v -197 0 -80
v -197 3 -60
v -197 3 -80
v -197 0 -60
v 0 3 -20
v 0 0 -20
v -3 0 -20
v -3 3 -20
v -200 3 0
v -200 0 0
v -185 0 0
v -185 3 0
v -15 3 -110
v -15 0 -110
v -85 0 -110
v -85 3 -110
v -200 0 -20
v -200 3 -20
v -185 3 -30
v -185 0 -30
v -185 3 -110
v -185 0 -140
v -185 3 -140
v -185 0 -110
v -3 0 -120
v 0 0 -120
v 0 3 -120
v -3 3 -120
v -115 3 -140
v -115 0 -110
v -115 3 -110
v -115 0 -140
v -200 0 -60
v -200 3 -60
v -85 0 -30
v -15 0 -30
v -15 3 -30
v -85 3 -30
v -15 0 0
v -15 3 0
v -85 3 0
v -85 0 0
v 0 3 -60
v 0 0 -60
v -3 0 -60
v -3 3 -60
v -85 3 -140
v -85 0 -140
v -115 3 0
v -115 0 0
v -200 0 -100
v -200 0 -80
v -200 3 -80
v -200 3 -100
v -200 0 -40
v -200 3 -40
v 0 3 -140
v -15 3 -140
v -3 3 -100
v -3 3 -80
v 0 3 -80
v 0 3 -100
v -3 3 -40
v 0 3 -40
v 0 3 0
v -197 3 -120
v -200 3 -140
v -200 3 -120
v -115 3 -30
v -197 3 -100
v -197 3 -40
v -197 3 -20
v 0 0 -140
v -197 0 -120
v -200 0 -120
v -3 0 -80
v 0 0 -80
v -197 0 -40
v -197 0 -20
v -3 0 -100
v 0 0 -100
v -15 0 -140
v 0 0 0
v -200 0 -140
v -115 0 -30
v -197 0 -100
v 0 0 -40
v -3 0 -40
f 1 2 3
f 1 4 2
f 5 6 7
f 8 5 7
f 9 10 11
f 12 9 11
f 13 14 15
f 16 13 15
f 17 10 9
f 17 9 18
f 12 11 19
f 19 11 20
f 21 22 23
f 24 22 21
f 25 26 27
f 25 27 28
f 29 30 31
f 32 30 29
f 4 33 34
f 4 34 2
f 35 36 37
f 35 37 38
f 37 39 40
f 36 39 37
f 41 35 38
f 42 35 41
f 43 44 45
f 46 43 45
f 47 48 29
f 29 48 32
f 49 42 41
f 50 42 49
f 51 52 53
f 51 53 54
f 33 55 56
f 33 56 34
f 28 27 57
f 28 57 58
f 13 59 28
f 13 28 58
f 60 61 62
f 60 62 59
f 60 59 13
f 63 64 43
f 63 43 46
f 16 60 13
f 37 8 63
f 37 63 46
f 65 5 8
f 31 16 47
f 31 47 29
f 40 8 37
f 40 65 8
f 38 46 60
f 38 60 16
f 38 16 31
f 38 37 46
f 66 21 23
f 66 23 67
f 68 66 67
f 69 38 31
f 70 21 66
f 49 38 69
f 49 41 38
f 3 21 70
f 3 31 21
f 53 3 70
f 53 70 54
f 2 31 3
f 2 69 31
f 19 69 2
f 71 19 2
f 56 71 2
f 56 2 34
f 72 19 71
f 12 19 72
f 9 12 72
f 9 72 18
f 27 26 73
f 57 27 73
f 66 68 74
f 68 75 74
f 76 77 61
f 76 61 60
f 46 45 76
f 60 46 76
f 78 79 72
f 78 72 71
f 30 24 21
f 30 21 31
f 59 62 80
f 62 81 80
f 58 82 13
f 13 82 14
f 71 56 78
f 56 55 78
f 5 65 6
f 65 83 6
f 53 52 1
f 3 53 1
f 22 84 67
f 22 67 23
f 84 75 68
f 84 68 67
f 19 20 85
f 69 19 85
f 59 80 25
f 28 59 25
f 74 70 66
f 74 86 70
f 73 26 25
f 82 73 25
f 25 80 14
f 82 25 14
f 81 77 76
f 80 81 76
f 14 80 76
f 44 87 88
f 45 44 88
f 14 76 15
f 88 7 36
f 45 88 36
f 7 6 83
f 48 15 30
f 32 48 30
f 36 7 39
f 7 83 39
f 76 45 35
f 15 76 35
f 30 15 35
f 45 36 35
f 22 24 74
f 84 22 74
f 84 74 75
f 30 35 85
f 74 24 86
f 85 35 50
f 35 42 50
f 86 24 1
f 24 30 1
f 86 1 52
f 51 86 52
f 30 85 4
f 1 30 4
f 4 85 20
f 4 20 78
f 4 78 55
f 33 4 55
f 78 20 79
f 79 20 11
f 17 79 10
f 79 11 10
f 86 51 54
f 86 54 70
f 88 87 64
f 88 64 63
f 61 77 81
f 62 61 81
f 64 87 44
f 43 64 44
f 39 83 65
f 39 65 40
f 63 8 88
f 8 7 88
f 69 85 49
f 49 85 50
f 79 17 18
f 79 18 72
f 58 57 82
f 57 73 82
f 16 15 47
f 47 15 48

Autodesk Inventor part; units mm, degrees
ref_plane "YZ Plane" through (0, 0, 0) normal (1, 0, 0) x (0, 1, 0)
ref_plane "XZ Plane" through (0, 0, 0) normal (0, 1, 0) x (-1, 0, 0)
ref_plane "XY Plane" through (0, 0, 0) normal (0, 0, 1) x (1, 0, 0)
sketch "Sketch1" plane through (0, 0, 0) normal (0, 1, 0) x (-1, 0, 0)
  line L0 (200, 0) -> (185, 0)
  line L1 (200, 0) -> (215, 0) construction
  line L2 (185, 0) -> (185, -30)
  line L3 (185, -30) -> (115, -30)
  line L4 (115, -30) -> (115, 0)
  line L5 (200, -140) -> (185, -140)
  line L6 (200, -140) -> (215, -140) construction
  line L7 (185, -140) -> (185, -110)
  line L8 (185, -110) -> (115, -110)
  line L9 (115, -110) -> (115, -140)
  line L10 (200, 0) -> (197, 0)
  line L11 (197, 0) -> (197, -140)
  line L12 (197, 0) -> (337, 0) construction
  line L13 (200, 0) -> (200, -20)
  line L14 (200, -20) -> (200, -40)
  line L15 (200, -40) -> (200, -60)
  line L16 (200, -60) -> (200, -80)
  line L17 (200, -80) -> (200, -100)
  line L18 (200, -100) -> (200, -120)
  line L19 (200, -120) -> (200, -140)
  line L20 (200, -20) -> (197, -20)
  line L21 (200, -40) -> (197, -40)
  line L22 (200, -60) -> (197, -60)
  line L23 (200, -80) -> (197, -80)
  line L24 (200, -100) -> (197, -100)
  line L25 (200, -120) -> (197, -120)
  line L26 (100, 0) -> (100, -140)
  line L27 (100, -140) -> (200, -140)
  line L28 (100, 0) -> (200, 0)
  line L29 (0, 0) -> (15, 0)
  line L30 (0, 0) -> (-15, 0) construction
  line L31 (15, 0) -> (15, -30)
  line L32 (15, -30) -> (85, -30)
  line L33 (85, -30) -> (85, 0)
  line L34 (85, -110) -> (85, -140)
  line L35 (15, -140) -> (15, -110)
  line L36 (15, -110) -> (85, -110)
  line L37 (0, -140) -> (15, -140)
  line L38 (0, -140) -> (-15, -140) construction
  line L39 (0, 0) -> (3, 0)
  line L40 (3, 0) -> (3, -140)
  line L41 (3, 0) -> (-137, 0) construction
  line L42 (0, 0) -> (0, -20)
  line L43 (0, -20) -> (0, -40)
  line L44 (0, -40) -> (0, -60)
  line L45 (0, -60) -> (0, -80)
  line L46 (0, -80) -> (0, -100)
  line L47 (0, -100) -> (0, -120)
  line L48 (0, -120) -> (0, -140)
  line L49 (0, -20) -> (3, -20)
  line L50 (0, -40) -> (3, -40)
  line L51 (0, -60) -> (3, -60)
  line L52 (0, -80) -> (3, -80)
  line L53 (0, -100) -> (3, -100)
  line L54 (0, -120) -> (3, -120)
  line L55 (100, -140) -> (0, -140)
  line L56 (100, 0) -> (0, 0)
  dimension "d2" = 15
  dimension "d3" = 180
  dimension "d4" = 30
  dimension "d5" = 70
  dimension "d6" = 90
  dimension "d12" = 3
  dimension "d13" = 140
  dimension "d14" = 90
  dimension "d15" = 20
  dimension "d16" = 20
  dimension "d17" = 20
  dimension "d18" = 20
  dimension "d19" = 20
  dimension "d20" = 20
  dimension "d21" = 20
extrude "Extrusion1" add sketch "Sketch1" along normal blind 3 contours L13 L20 L11 L0 | L11 L5 L7 L8 L9 L27 L26 L28 L4 L3 L2 L0 | L15 L22 L11 L21 | L26 L55 L34 L36 L35 L37 L40 L29 L31 L32 L33 L56 | L17 L24 L11 L23 | L19 L5 L11 L25 | L40 L49 L42 L29 | L37 L48 L54 L40 | L40 L51 L44 L50 | L53 L46 L52 L40
properties part number "onderkant"
